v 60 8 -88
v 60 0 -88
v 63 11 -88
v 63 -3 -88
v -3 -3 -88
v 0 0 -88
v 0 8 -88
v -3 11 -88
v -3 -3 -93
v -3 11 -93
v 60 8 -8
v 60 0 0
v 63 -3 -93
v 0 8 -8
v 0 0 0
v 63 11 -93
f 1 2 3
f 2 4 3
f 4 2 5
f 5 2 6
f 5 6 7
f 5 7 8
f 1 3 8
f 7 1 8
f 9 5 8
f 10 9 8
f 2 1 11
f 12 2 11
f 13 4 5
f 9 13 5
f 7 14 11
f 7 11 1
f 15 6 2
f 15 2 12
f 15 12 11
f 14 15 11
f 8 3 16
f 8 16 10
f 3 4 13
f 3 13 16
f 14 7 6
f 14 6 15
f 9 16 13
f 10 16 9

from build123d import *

# Parameters (mm, degrees)
BOSS_EXTRUDE1_DEPTH = 60
SKETCH3_W           = 66
SKETCH3_H           = 14
BOSS_EXTRUDE2_DEPTH = 5


with BuildPart() as part:
    # Sketch1 → Boss-Extrude1 (new body)
    with BuildSketch(Plane(origin=(0, 0, 0), x_dir=(0, 0, -1), z_dir=(1, 0, 0))):
        Polygon((0, 0), (8, 8), (88, 8), (88, 0), align=None)
    extrude(amount=BOSS_EXTRUDE1_DEPTH)

    # Sketch3 → Boss-Extrude2 (add)
    with BuildSketch(Plane(origin=(0, 0, -88), x_dir=(-1, 0, 0), z_dir=(0, 0, -1))):
        with Locations((-30, 4)):
            Rectangle(SKETCH3_W, SKETCH3_H)
    extrude(amount=BOSS_EXTRUDE2_DEPTH)


solid = part.part
